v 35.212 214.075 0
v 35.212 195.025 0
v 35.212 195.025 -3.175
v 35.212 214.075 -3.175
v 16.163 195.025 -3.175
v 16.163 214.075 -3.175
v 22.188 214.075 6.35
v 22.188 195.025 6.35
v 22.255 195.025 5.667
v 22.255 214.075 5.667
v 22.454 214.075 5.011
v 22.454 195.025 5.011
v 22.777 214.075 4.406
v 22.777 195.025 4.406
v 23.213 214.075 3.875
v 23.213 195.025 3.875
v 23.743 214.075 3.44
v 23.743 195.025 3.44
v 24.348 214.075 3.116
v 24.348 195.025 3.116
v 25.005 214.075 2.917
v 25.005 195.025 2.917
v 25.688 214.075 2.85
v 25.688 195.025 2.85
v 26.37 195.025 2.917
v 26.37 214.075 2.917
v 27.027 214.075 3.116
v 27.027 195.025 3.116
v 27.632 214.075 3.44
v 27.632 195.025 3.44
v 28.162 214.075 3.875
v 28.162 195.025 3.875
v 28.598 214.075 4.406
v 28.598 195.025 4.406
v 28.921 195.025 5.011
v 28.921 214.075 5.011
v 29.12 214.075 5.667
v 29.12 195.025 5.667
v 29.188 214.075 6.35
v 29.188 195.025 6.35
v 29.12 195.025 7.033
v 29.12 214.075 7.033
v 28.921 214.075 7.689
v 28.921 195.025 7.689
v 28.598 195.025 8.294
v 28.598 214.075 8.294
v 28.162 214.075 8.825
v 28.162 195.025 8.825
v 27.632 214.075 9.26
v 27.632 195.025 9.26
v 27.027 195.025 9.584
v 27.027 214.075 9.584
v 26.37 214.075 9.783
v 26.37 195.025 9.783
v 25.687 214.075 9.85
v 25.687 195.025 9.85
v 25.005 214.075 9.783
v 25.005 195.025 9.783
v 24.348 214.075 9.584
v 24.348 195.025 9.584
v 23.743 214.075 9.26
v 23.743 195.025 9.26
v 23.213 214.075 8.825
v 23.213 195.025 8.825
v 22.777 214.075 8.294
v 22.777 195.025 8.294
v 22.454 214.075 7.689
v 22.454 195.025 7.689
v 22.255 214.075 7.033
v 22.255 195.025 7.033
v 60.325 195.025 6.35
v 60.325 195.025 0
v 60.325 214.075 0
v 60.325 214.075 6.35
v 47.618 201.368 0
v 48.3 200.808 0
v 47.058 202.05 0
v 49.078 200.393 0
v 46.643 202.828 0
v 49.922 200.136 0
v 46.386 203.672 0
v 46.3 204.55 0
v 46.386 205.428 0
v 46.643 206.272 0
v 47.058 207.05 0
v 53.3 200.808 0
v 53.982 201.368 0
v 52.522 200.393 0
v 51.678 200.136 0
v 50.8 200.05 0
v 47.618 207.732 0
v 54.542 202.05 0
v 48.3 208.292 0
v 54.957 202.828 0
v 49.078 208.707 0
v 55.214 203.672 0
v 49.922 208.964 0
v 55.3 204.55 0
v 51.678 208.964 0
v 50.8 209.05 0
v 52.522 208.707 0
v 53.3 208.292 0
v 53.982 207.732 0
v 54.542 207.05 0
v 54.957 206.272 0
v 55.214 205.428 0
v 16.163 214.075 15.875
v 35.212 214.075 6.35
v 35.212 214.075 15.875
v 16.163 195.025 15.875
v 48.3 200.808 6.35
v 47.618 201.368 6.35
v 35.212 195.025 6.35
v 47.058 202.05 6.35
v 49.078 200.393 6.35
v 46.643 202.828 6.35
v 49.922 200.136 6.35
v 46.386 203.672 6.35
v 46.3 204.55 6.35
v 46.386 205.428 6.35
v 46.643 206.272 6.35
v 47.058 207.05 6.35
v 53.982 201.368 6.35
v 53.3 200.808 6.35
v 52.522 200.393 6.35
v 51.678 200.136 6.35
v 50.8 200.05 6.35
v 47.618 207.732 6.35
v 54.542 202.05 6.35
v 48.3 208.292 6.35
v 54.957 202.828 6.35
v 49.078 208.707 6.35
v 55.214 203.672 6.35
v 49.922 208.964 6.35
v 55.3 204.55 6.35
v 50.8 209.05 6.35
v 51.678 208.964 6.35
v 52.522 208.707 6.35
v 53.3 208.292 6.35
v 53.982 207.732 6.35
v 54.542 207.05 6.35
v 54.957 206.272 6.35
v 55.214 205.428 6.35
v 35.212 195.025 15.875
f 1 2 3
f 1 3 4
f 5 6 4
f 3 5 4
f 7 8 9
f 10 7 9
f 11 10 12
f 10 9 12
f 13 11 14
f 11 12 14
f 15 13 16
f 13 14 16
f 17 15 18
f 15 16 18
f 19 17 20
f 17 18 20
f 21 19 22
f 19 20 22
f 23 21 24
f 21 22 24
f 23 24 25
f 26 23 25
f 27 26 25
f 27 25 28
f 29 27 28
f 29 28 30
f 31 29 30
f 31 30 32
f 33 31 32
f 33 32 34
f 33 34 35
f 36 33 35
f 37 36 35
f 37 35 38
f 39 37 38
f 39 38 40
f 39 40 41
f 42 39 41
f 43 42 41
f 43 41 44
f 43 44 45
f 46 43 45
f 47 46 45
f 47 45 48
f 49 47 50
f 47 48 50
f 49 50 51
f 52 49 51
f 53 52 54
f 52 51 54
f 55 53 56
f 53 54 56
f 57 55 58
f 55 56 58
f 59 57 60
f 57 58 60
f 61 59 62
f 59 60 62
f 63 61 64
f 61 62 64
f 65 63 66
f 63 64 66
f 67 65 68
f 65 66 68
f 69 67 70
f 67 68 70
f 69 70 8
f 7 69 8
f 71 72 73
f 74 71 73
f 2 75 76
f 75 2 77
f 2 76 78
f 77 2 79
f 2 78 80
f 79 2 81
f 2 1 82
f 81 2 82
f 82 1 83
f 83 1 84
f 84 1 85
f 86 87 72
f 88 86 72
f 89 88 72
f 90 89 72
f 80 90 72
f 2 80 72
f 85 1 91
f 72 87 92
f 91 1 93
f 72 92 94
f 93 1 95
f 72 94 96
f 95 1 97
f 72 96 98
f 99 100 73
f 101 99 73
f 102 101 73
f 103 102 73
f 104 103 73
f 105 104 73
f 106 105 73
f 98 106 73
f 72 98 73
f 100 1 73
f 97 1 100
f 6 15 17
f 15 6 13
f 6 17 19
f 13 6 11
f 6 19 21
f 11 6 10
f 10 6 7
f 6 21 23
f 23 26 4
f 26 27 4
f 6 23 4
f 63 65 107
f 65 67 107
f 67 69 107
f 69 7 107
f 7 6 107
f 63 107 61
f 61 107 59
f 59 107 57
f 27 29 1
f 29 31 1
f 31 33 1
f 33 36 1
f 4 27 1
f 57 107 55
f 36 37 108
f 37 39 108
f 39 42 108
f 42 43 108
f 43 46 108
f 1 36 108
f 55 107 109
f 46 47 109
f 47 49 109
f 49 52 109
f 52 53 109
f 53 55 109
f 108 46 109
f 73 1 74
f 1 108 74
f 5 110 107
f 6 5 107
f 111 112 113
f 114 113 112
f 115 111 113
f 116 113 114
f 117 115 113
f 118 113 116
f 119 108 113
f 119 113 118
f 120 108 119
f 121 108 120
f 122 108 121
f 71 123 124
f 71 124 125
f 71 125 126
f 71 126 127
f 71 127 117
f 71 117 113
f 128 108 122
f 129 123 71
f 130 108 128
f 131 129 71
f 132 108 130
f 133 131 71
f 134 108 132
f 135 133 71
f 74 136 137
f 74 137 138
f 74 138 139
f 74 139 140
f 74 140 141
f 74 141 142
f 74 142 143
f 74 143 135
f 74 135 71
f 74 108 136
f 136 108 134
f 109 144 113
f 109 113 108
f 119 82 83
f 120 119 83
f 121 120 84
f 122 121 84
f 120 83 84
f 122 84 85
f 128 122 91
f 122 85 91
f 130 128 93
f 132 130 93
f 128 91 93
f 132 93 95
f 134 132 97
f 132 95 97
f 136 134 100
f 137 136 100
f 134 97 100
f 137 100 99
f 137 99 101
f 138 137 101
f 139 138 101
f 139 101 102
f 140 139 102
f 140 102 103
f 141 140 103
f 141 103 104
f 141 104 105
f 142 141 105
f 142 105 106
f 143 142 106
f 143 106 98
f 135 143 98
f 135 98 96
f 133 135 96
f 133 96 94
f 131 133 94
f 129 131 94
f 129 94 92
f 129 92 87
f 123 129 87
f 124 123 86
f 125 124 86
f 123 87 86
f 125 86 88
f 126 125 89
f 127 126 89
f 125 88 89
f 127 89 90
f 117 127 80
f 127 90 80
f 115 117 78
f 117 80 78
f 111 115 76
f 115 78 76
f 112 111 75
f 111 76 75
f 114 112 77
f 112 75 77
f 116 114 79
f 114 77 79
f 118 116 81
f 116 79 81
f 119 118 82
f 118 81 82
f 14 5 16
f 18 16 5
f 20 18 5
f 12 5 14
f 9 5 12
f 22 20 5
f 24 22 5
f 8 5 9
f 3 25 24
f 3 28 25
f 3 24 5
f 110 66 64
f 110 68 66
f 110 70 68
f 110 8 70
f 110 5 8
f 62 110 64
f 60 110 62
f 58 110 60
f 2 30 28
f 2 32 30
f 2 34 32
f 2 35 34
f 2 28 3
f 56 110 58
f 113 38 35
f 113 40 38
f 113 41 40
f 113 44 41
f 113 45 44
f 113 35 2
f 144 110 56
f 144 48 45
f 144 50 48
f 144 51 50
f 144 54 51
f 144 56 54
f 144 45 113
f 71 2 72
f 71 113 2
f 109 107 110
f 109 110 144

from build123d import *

# Parameters (mm, degrees)
SKETCH1_W                 = 44.1625
SKETCH1_H                 = 19.05
BOSS_EXTRUDE1_DEPTH       = 6.35
SKETCH2_W                 = 19.05
SKETCH2_H                 = 19.05
BOSS_EXTRUDE2_DEPTH       = 9.525
M8X1_0_TAPPED_HOLE1_D     = 7
M8X1_0_TAPPED_HOLE1_DEPTH = 21.082
M8X1_0_TAPPED_HOLE1_TIP   = 2.103012167
M8_CLEARANCE_HOLE1_D      = 9
M8_CLEARANCE_HOLE1_DEPTH  = 21.082
M8_CLEARANCE_HOLE1_TIP    = 2.703872786


with BuildPart() as part:
    # Sketch1 → Boss-Extrude1 (new body)
    with BuildSketch(Plane.XY):
        with Locations((38.24375, 204.55)):
            Rectangle(SKETCH1_W, SKETCH1_H)
    extrude(amount=BOSS_EXTRUDE1_DEPTH)

    # Sketch2 → Boss-Extrude2 (add, symmetric)
    with BuildSketch(Plane.XY.offset(6.35)):
        with Locations((25.6875, 204.55)):
            Rectangle(SKETCH2_W, SKETCH2_H)
    extrude(amount=BOSS_EXTRUDE2_DEPTH, both=True)

    # M8x1.0 Tapped Hole1
    with Locations(Plane(origin=(0, 214.075, 0), x_dir=(1, 0, 0), z_dir=(0, 1, 0))):
        with Locations((25.6875, -6.35)):
            Hole(M8X1_0_TAPPED_HOLE1_D / 2, depth=M8X1_0_TAPPED_HOLE1_DEPTH)
            with Locations((0, 0, -(M8X1_0_TAPPED_HOLE1_DEPTH + M8X1_0_TAPPED_HOLE1_TIP / 2))):  # 118° drill point
                Cone(0, M8X1_0_TAPPED_HOLE1_D / 2, M8X1_0_TAPPED_HOLE1_TIP, mode=Mode.SUBTRACT)

    # M8 Clearance Hole1
    with Locations(Plane.XY.offset(6.35)):
        with Locations((50.8, 204.55)):
            Hole(M8_CLEARANCE_HOLE1_D / 2, depth=M8_CLEARANCE_HOLE1_DEPTH)
            with Locations((0, 0, -(M8_CLEARANCE_HOLE1_DEPTH + M8_CLEARANCE_HOLE1_TIP / 2))):  # 118° drill point
                Cone(0, M8_CLEARANCE_HOLE1_D / 2, M8_CLEARANCE_HOLE1_TIP, mode=Mode.SUBTRACT)


solid = part.part
